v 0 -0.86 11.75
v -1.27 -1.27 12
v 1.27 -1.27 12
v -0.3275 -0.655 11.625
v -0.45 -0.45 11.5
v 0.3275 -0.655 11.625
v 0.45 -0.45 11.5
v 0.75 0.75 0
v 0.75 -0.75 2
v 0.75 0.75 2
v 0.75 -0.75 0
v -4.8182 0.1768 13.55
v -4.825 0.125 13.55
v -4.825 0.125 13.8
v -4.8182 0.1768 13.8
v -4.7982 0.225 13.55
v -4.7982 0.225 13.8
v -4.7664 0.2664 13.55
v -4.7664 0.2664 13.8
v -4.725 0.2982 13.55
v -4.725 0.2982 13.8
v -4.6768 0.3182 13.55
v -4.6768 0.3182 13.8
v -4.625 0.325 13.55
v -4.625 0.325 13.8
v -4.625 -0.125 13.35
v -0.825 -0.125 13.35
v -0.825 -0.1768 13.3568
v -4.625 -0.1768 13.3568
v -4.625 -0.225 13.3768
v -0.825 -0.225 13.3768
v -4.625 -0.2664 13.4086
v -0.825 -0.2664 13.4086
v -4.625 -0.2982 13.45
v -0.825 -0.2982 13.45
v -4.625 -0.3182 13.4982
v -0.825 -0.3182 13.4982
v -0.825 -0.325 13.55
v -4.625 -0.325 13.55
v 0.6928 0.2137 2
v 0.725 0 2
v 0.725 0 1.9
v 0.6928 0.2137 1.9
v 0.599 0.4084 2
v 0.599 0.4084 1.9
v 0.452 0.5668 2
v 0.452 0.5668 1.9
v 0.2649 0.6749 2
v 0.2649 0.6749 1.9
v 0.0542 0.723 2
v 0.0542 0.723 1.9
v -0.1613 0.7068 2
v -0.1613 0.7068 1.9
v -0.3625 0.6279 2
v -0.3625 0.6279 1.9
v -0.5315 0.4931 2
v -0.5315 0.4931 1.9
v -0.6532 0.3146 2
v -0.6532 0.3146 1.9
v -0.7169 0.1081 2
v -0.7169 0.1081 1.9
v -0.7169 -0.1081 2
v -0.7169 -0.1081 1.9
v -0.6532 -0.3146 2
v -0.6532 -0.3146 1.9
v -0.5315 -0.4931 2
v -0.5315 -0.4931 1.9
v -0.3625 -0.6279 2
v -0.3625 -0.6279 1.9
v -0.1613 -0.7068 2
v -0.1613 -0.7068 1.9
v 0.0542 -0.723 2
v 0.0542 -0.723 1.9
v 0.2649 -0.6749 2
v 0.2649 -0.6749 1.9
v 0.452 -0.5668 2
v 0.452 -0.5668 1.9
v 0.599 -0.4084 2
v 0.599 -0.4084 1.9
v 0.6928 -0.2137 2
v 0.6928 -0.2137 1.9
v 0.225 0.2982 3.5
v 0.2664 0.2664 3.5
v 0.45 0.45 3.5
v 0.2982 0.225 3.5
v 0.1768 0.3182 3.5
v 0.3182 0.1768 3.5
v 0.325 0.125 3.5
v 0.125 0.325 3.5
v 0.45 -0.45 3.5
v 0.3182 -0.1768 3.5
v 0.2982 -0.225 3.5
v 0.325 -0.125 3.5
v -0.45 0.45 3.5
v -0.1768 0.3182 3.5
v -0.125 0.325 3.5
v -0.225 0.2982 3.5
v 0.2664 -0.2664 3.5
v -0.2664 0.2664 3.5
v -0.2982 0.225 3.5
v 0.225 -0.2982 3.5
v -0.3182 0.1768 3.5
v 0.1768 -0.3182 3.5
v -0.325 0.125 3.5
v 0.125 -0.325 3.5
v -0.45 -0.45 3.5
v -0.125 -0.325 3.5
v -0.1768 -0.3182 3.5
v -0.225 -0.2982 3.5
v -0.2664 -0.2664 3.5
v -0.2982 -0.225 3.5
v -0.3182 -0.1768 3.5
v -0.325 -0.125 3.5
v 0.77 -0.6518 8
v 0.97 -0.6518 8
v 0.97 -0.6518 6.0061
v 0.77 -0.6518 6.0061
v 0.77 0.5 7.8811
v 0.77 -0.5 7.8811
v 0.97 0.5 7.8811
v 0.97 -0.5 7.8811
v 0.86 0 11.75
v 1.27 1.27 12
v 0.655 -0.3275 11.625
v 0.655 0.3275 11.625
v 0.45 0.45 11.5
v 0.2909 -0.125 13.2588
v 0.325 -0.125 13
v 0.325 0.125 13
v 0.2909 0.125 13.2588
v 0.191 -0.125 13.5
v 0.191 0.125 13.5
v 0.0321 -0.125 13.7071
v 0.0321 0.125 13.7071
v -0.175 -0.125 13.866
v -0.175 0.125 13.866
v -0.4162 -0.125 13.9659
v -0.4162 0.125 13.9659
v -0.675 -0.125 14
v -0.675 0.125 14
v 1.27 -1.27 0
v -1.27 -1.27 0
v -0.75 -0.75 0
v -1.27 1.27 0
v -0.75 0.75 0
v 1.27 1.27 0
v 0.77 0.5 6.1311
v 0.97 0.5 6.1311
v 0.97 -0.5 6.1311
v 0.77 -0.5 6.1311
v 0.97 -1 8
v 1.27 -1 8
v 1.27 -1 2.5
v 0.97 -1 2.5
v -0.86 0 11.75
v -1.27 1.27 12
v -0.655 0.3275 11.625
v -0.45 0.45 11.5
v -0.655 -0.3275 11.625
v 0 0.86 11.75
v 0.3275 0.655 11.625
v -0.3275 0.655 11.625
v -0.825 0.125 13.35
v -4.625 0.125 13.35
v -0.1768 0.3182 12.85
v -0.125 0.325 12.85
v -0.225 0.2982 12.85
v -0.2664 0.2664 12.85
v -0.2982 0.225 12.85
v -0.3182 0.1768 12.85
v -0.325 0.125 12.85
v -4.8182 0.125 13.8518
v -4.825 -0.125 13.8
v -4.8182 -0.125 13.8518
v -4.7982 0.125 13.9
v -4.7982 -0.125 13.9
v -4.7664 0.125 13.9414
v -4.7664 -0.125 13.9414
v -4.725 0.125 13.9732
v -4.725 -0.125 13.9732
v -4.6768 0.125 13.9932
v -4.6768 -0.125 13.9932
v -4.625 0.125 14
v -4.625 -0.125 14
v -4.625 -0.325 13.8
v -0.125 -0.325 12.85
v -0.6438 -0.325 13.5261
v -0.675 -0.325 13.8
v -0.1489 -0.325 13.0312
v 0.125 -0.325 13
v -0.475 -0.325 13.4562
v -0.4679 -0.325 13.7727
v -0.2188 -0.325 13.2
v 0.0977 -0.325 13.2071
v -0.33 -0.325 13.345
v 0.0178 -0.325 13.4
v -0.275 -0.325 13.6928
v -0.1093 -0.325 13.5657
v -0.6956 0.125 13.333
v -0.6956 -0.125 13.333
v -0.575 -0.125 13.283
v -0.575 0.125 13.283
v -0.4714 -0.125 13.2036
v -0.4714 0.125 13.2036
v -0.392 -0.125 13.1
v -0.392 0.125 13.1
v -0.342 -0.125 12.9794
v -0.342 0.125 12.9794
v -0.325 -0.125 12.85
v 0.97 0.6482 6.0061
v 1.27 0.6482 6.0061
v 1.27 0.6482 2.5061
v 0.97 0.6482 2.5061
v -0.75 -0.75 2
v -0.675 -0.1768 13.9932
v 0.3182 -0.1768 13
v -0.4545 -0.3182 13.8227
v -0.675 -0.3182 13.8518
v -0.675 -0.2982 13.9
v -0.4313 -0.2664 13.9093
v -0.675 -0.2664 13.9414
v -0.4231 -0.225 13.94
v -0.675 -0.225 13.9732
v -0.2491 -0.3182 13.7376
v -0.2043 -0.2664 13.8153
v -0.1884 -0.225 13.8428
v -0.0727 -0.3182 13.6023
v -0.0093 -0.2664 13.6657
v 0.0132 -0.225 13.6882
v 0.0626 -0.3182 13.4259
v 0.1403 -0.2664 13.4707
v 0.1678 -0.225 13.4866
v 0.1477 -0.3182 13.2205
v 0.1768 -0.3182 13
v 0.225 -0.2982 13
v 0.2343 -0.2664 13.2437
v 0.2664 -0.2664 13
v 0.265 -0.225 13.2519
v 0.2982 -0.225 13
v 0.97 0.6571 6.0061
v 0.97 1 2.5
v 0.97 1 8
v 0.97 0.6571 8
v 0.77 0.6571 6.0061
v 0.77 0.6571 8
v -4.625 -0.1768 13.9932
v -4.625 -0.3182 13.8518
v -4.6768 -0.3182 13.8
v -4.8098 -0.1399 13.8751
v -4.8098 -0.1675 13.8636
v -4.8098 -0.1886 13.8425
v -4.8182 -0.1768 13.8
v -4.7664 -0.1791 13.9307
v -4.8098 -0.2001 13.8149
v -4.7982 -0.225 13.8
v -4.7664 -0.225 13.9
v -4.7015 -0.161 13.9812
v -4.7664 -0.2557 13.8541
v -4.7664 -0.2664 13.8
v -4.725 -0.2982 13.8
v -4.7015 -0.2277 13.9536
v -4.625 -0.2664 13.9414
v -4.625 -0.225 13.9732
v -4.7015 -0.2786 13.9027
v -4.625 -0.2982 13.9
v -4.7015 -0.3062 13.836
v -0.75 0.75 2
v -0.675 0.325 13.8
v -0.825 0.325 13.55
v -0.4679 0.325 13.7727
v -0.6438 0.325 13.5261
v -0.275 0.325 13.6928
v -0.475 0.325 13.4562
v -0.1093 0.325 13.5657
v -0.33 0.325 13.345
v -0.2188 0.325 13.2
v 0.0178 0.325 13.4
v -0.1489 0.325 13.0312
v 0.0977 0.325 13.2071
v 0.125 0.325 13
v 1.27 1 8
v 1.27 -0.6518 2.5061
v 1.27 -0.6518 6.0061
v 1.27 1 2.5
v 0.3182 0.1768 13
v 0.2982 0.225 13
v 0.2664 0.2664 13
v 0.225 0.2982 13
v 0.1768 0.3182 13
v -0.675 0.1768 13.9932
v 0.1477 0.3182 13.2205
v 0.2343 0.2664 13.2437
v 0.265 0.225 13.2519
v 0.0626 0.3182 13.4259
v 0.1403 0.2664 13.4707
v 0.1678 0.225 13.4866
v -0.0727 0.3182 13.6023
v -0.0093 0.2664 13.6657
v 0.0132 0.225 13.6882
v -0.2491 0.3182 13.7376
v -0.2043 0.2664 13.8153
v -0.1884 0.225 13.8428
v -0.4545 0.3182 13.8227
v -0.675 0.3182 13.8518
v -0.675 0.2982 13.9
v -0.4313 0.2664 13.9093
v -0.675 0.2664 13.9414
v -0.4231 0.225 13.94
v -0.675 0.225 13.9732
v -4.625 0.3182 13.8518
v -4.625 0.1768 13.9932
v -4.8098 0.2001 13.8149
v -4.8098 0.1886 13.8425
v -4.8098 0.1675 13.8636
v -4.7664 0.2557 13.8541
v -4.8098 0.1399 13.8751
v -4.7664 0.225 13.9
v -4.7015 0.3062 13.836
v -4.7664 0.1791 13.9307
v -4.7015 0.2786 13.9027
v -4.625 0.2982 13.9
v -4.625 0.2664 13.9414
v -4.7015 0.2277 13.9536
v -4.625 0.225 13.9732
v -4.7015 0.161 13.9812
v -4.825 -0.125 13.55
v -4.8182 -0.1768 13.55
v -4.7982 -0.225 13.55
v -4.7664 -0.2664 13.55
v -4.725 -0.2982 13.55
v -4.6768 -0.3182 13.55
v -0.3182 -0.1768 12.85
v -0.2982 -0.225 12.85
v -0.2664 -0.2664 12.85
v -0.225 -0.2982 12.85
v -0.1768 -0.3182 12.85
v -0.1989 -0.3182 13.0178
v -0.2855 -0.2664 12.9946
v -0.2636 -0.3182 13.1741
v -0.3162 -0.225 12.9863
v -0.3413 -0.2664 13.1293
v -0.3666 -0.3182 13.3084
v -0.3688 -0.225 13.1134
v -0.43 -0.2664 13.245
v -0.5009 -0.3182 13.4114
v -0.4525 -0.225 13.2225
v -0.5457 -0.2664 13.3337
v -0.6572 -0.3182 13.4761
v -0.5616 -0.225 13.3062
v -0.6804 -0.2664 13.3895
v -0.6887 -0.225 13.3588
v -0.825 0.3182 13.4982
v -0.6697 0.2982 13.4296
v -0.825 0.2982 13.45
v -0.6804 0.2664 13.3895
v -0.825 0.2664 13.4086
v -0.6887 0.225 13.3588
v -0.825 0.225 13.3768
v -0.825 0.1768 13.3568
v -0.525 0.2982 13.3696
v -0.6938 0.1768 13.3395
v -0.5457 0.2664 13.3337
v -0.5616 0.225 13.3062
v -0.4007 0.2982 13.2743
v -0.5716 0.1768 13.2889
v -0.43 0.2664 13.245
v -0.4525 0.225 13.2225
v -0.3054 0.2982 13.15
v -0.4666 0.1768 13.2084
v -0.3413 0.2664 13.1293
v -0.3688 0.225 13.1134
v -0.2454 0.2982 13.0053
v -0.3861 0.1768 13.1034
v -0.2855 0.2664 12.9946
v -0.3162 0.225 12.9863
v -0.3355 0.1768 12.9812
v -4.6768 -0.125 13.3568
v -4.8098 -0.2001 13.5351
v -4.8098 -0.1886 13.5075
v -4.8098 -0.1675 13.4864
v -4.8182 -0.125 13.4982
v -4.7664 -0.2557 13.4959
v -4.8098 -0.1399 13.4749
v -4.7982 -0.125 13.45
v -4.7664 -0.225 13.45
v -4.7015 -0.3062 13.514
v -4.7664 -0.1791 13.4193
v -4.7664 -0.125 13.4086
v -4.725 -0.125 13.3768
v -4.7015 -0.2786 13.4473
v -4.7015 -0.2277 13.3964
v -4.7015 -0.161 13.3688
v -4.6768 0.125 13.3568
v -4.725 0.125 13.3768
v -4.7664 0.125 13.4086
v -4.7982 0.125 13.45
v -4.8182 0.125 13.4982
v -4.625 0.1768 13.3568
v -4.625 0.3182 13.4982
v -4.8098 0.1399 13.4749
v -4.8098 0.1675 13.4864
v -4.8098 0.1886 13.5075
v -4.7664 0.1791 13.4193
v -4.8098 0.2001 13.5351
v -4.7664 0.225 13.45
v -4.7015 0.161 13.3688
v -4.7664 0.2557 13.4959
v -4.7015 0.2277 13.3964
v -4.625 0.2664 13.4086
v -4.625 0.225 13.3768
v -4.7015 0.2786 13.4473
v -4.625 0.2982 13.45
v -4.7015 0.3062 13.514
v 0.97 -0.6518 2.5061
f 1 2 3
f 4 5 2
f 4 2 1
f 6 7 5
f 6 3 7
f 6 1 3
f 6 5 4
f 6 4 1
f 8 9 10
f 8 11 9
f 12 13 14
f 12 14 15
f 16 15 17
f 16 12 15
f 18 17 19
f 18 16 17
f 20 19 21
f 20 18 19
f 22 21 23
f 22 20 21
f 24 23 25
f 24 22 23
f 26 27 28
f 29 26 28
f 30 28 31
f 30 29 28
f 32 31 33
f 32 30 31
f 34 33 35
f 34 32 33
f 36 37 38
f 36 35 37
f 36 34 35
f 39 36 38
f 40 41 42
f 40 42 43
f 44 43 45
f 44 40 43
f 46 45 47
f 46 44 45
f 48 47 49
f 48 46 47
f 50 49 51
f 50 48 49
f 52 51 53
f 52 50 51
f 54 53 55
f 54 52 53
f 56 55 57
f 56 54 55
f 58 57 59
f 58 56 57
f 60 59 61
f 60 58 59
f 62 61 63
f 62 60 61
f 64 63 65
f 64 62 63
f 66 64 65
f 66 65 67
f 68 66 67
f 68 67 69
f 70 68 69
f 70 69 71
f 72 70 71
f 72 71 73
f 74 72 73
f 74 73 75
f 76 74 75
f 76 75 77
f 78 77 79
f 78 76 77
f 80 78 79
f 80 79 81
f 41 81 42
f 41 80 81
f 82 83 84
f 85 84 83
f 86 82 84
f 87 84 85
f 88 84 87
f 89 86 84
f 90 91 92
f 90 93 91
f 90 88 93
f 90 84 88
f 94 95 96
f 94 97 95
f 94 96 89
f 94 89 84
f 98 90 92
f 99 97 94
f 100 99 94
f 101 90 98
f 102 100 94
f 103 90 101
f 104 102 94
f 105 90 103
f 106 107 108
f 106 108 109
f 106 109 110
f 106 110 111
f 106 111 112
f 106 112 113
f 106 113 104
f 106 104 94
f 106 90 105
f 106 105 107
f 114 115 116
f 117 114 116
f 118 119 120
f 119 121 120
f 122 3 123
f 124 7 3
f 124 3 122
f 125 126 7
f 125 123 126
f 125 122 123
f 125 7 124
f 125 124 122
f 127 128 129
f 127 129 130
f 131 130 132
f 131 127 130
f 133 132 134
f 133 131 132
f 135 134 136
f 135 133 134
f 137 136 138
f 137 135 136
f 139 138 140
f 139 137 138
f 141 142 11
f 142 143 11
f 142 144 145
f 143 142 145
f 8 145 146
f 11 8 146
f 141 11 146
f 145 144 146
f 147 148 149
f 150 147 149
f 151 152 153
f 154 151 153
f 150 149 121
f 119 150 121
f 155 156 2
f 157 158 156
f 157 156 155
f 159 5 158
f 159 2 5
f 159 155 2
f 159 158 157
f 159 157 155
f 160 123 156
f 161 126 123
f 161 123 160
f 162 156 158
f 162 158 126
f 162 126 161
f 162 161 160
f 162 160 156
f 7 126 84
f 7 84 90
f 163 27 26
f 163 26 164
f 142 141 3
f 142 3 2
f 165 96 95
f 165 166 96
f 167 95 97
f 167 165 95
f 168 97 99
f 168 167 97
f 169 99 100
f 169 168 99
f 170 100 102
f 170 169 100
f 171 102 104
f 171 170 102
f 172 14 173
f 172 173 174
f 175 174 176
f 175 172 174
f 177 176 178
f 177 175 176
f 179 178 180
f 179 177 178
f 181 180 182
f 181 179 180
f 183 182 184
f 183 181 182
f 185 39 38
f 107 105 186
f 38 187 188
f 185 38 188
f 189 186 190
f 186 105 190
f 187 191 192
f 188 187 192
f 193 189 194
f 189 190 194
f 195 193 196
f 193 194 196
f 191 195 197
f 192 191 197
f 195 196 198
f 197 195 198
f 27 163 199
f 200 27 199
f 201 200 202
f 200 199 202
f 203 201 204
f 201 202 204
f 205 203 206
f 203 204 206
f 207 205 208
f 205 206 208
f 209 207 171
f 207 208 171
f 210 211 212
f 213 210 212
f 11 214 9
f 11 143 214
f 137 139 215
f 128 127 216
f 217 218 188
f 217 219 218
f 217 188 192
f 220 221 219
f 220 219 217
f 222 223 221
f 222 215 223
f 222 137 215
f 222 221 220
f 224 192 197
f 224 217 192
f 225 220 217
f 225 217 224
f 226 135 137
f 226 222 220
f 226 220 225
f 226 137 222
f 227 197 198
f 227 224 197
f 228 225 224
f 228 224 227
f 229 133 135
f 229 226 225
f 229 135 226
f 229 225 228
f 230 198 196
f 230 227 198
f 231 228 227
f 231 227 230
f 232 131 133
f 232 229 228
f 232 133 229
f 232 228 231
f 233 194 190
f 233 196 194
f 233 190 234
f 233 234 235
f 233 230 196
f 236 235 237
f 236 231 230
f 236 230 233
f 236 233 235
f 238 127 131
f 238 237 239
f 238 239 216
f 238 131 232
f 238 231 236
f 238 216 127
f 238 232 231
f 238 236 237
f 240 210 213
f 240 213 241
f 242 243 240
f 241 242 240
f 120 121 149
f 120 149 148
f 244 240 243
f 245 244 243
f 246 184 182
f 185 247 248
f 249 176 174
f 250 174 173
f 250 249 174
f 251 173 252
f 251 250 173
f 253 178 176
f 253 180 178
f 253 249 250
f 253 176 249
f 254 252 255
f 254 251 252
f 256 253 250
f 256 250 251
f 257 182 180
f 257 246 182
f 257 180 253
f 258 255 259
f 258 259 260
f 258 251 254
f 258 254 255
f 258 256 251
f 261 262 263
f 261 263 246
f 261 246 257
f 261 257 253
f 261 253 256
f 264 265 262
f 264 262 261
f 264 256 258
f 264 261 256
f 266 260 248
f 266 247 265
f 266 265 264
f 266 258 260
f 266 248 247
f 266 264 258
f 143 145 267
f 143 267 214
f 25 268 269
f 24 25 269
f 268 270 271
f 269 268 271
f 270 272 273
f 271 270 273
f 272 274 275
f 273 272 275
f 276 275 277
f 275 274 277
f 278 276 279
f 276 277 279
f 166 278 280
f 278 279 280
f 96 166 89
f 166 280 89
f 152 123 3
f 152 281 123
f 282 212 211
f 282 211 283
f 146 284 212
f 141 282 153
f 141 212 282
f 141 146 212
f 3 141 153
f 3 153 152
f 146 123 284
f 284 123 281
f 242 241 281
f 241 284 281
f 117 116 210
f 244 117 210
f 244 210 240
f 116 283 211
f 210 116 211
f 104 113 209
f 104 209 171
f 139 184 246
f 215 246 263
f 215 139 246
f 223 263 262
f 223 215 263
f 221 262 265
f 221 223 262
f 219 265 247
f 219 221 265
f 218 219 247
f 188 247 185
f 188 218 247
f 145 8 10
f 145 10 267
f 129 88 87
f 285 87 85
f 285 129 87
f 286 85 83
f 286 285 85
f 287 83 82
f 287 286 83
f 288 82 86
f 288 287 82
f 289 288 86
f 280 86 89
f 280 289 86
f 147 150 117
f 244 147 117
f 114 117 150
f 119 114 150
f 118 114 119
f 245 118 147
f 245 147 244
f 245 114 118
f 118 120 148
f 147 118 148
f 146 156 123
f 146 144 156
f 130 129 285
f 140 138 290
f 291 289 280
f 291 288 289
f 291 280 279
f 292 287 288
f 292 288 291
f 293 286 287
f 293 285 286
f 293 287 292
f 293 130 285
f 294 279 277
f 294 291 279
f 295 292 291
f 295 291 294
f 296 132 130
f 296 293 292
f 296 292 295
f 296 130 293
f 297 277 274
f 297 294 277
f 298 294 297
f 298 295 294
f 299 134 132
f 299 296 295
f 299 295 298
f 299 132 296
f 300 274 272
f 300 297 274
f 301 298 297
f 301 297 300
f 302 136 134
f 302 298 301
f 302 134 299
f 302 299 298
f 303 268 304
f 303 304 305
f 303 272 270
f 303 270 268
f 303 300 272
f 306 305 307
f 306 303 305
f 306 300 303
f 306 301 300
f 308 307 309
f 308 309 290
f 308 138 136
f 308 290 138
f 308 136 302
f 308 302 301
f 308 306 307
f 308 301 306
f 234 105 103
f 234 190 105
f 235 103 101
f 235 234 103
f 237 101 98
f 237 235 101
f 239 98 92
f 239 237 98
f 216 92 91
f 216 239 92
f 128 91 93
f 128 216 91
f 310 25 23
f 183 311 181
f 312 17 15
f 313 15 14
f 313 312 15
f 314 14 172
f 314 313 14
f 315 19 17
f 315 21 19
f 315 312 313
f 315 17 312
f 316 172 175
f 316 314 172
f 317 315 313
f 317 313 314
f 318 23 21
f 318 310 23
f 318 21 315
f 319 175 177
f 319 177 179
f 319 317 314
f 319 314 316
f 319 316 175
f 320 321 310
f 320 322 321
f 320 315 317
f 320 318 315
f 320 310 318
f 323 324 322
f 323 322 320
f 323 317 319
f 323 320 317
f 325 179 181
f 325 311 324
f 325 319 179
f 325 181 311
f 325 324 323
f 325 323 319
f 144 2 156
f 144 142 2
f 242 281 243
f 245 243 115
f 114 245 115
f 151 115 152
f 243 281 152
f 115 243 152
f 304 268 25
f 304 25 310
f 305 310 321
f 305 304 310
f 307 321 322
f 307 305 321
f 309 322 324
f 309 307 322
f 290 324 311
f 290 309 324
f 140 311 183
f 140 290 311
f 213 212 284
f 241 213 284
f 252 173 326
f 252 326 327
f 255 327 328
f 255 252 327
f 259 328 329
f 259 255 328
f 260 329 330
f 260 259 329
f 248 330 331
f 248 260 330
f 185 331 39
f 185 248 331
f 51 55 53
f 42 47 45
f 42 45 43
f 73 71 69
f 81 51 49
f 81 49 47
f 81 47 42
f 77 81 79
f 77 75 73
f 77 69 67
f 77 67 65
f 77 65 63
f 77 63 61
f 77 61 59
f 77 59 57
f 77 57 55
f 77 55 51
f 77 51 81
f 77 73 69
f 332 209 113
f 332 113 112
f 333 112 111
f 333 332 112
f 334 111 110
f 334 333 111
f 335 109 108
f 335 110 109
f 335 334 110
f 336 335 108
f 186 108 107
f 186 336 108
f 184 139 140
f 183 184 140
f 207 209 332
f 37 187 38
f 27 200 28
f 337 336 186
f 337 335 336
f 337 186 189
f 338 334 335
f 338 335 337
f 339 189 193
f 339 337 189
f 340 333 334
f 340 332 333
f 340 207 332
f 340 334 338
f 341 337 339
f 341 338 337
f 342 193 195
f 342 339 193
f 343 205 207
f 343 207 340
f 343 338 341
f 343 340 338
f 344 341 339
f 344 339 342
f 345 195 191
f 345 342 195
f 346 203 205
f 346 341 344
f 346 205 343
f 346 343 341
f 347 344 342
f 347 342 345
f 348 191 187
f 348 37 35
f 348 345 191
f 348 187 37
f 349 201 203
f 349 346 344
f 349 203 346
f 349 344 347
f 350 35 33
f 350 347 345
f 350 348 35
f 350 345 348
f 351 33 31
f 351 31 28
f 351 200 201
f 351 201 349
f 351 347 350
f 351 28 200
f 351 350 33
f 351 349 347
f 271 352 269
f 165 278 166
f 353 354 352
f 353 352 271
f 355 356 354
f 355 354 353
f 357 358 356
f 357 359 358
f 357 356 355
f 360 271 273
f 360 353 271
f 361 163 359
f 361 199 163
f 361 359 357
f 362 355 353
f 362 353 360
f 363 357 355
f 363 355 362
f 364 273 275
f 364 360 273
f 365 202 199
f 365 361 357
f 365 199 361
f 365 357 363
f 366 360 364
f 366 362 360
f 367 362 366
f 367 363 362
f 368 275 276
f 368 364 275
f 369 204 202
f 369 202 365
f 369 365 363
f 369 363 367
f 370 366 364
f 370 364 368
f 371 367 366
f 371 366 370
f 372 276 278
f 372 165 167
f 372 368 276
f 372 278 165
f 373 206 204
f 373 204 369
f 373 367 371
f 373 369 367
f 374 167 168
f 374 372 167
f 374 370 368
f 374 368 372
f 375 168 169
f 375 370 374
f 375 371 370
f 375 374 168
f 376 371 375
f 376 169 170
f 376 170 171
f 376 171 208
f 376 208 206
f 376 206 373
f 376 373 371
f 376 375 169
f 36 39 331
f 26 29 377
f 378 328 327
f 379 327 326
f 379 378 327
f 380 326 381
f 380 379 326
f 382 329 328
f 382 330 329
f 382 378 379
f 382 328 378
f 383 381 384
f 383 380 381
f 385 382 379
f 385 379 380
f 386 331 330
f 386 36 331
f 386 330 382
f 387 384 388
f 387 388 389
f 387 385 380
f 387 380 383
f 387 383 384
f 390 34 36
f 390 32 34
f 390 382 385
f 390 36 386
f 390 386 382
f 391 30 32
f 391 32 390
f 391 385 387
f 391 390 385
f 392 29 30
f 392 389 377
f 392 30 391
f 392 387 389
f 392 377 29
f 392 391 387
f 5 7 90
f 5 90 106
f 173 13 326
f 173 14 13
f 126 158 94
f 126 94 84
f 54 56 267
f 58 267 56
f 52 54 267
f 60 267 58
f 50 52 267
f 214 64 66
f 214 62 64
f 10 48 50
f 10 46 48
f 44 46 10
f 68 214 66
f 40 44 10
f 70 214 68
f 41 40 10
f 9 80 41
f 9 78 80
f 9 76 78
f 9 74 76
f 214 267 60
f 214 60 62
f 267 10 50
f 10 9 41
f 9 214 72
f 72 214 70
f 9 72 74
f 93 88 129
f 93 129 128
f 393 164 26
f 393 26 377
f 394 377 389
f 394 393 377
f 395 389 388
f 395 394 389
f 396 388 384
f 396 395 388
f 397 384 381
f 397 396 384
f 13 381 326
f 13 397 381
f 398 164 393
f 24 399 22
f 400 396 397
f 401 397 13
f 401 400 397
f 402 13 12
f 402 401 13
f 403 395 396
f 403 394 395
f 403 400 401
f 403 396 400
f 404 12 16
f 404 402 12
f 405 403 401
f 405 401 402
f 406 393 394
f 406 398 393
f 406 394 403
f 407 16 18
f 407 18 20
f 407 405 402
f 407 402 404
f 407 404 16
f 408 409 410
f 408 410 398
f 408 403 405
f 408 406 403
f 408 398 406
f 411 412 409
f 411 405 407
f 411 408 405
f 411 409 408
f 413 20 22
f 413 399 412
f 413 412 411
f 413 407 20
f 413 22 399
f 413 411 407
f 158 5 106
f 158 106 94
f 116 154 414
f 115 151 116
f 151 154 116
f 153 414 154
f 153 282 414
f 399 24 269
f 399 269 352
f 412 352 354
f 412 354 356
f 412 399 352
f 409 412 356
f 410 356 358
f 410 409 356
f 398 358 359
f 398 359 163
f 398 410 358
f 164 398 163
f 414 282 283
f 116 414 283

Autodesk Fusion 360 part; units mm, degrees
sketch "Sketch1" plane through (0, 0, 0) normal (0, 0, 1) x (1, 0, 0)
  line L0 (1.27, -1.27) -> (-1.27, -1.27)
  line L1 (-1.27, -1.27) -> (-1.27, 1.27)
  line L2 (-1.27, 1.27) -> (1.27, 1.27)
  line L3 (1.27, 1.27) -> (1.27, -1.27)
  line L4 (1.27, -1.27) -> (-1.27, 1.27) construction
  line L5 (-1.27, -1.27) -> (1.27, 1.27) construction
  dimension "d1" = 2.54
  dimension "d2" = 2.54
extrude "Extrude1" add sketch "Sketch1" along normal blind 12
sketch "Sketch2" plane through (0, 0, 12) normal (0, 0, 1) x (-1, 0, 0)
  line L0 (-1.27, -1.27) -> (1.27, -1.27)
  line L1 (1.27, -1.27) -> (1.27, 1.27)
  line L2 (1.27, 1.27) -> (-1.27, 1.27)
  line L3 (-1.27, 1.27) -> (-1.27, -1.27)
  line L4 (-0.45, 0.45) -> (0.45, 0.45)
  line L5 (0.45, 0.45) -> (0.45, -0.45)
  line L6 (0.45, -0.45) -> (-0.45, -0.45)
  line L7 (-0.45, -0.45) -> (-0.45, 0.45)
  line L8 (-0.45, 0.45) -> (0.45, -0.45) construction
  line L9 (0.45, 0.45) -> (-0.45, -0.45) construction
  dimension "d5" = 0.9
  dimension "d6" = 0.9
extrude "Extrude2" cut sketch "Sketch2" against normal blind 0.5 contours L4 L5 L6 L7
loft "Loft1" cut profiles "Sketch2" section 1 section 2 face at (0.15, -0.15, 11.5)
extrude "Extrude3" cut 1 faces at (0.15, -0.15, 11.5) along direction (0, 0, -1) blind 8
sketch "Sketch3" plane through (1.27, 0, 0) normal (1, 0, 0) x (0, 1, 0)
  line L0 (-1.27, 0) -> (1.27, 0)
  line L1 (1.27, 0) -> (1.27, 12)
  line L2 (1.27, 12) -> (-1.27, 12)
  line L3 (-1.27, 12) -> (-1.27, 0)
  line L4 (1, 8) -> (-1, 8)
  line L5 (-1, 8) -> (-1, 2.5)
  line L6 (-1, 2.5) -> (1, 2.5)
  line L7 (1, 2.5) -> (1, 8)
  line L8 (1, 8) -> (-1, 2.5) construction
  line L9 (-1, 8) -> (1, 2.5) construction
  line L10 (0.6482, 2.5061) -> (-0.6518, 2.5061)
  line L11 (-0.6518, 2.5061) -> (-0.6518, 6.0061)
  line L12 (-0.6518, 6.0061) -> (0.6482, 6.0061)
  line L13 (0.6482, 6.0061) -> (0.6482, 2.5061)
  line L14 (0.6482, 2.5061) -> (-0.6518, 6.0061) construction
  line L15 (-0.6518, 2.5061) -> (0.6482, 6.0061) construction
  line L16 (-0.6518, 6.0061) -> (0.6571, 6.0061)
  line L17 (0.6571, 6.0061) -> (0.6571, 8.0061)
  line L18 (0.6571, 8.0061) -> (-0.6518, 8.0061)
  line L19 (-0.6518, 8.0061) -> (-0.6518, 6.0061)
  line L20 (0.5, 6.1311) -> (-0.5, 6.1311)
  line L21 (-0.5, 6.1311) -> (-0.5, 7.8811)
  line L22 (-0.5, 7.8811) -> (0.5, 7.8811)
  line L23 (0.5, 7.8811) -> (0.5, 6.1311)
  line L24 (0.5, 6.1311) -> (-0.5, 7.8811) construction
  line L25 (-0.5, 6.1311) -> (0.5, 7.8811) construction
  line L26 (-1.27, 6) -> (-0.6518, 6.0061)
  line L27 (0.6571, 6.0061) -> (1.27, 6)
  line L28 (0.6482, 2.5061) -> (1, 2.5)
  line L29 (-0.6518, 2.5061) -> (-1, 2.5)
  point P0 (0, 5.25)
  point P1 (-0.0018, 4.2561)
  point P2 (0, 7.0061)
  dimension "d11" = 5.5
  dimension "d12" = 2.5
  dimension "d13" = 1.3
  dimension "d14" = 3.5
  dimension "d15" = 2
  dimension "d16" = 1
  dimension "d17" = 1.75
  dimension "d31" = 0.125
extrude "Extrude4" cut sketch "Sketch3" against normal blind 0.3 contours L5 L11 L26 L29 | L4 L5 L19 L26 | L4 L7 L17 L27 | L7 L13 L16 L27 L28
extrude "Extrude5" cut sketch "Sketch3" against normal blind 0.5 contours L4 L12 L16 L17 L19
extrude "Extrude6" cut sketch "Sketch3" against normal blind 0.3 contours L20 L21 L22 L23
sketch "Sketch4" plane through (0, 0, 0) normal (0, 0, -1) x (1, 0, 0)
  line L0 (-1.27, -1.27) -> (1.27, -1.27)
  line L1 (1.27, -1.27) -> (1.27, 1.27)
  line L2 (1.27, 1.27) -> (-1.27, 1.27)
  line L3 (-1.27, 1.27) -> (-1.27, -1.27)
  line L4 (0.75, -0.75) -> (-0.75, -0.75)
  line L5 (-0.75, -0.75) -> (-0.75, 0.75)
  line L6 (-0.75, 0.75) -> (0.75, 0.75)
  line L7 (0.75, 0.75) -> (0.75, -0.75)
  line L8 (0.75, -0.75) -> (-0.75, 0.75) construction
  line L9 (-0.75, -0.75) -> (0.75, 0.75) construction
  dimension "d24" = 1.5
  dimension "d25" = 1.5
extrude "Extrude7" cut sketch "Sketch4" against normal blind 2 contours L4 L5 L6 L7
sketch "Sketch5" plane through (0, 0, 2) normal (0, 0, -1) x (1, 0, 0)
  line L0 (0.75, 0.75) -> (-0.75, 0.75)
  line L1 (-0.75, 0.75) -> (-0.75, -0.75)
  line L2 (-0.75, -0.75) -> (0.75, -0.75)
  line L3 (0.75, -0.75) -> (0.75, 0.75)
  circle A0 centre (0, 0) radius 0.725
  dimension "d28" = 1.45
extrude "Extrude8" add sketch "Sketch5" along normal blind 0.1 contours A0
sketch "Sketch6" plane through (0, 0, 3.5) normal (0, 0, 1) x (-1, 0, 0)
  line L0 (-0.45, -0.45) -> (0.45, -0.45)
  line L1 (0.45, -0.45) -> (0.45, 0.45)
  line L2 (0.45, 0.45) -> (-0.45, 0.45)
  line L3 (-0.45, 0.45) -> (-0.45, -0.45)
  line L4 (-0.325, 0.325) -> (0.325, 0.325)
  line L5 (0.325, 0.325) -> (0.325, -0.325)
  line L6 (0.325, -0.325) -> (-0.325, -0.325)
  line L7 (-0.325, -0.325) -> (-0.325, 0.325)
  line L8 (-0.325, 0.325) -> (0.325, -0.325) construction
  line L9 (0.325, 0.325) -> (-0.325, -0.325) construction
  dimension "d32" = 0.65
  dimension "d33" = 0.65
extrude "Extrude9" add sketch "Sketch6" along normal blind 10.5 contours L4 L5 L6 L7
sketch "Sketch7" plane through (-0.325, 0, 0) normal (-1, 0, 0) x (0, -1, 0)
  line L0 (-0.325, 3.5) -> (0.325, 3.5)
  line L1 (0.325, 3.5) -> (0.325, 14)
  line L2 (0.325, 14) -> (-0.325, 14)
  line L3 (-0.325, 14) -> (-0.325, 3.5)
  line L4 (-0.325, 14) -> (0.325, 14)
  line L5 (0.325, 14) -> (0.325, 13.35)
  line L6 (0.325, 13.35) -> (-0.325, 13.35)
  line L7 (-0.325, 13.35) -> (-0.325, 14)
  dimension "d38" = 0.65
extrude "Extrude10" add sketch "Sketch7" along normal blind 4.5 contours L1 L2 L3 L4 L5 L6 L7
fillet "Fillet1" radius 0.2 12 edges at (0.325, -0.325, 8.75) (-0.325, -0.325, 8.425) (0.325, 0.325, 8.75) (-0.325, 0.325, 8.425) (-2.25, 0.325, 14) (-2.25, -0.325, 14) (-2.575, -0.325, 13.35) (-2.575, 0.325, 13.35) (-4.825, -0.325, 13.675) (-4.825, 0.325, 13.675) (-4.825, 0, 14) (-4.825, 0, 13.35)
fillet "Fillet1" radius 1 1 edges at (0.325, 0, 14)
fillet "Fillet1" radius 0.5 1 edges at (-0.325, 0, 13.35)
equation "d34 = 8.50 mm + 2 mm"
